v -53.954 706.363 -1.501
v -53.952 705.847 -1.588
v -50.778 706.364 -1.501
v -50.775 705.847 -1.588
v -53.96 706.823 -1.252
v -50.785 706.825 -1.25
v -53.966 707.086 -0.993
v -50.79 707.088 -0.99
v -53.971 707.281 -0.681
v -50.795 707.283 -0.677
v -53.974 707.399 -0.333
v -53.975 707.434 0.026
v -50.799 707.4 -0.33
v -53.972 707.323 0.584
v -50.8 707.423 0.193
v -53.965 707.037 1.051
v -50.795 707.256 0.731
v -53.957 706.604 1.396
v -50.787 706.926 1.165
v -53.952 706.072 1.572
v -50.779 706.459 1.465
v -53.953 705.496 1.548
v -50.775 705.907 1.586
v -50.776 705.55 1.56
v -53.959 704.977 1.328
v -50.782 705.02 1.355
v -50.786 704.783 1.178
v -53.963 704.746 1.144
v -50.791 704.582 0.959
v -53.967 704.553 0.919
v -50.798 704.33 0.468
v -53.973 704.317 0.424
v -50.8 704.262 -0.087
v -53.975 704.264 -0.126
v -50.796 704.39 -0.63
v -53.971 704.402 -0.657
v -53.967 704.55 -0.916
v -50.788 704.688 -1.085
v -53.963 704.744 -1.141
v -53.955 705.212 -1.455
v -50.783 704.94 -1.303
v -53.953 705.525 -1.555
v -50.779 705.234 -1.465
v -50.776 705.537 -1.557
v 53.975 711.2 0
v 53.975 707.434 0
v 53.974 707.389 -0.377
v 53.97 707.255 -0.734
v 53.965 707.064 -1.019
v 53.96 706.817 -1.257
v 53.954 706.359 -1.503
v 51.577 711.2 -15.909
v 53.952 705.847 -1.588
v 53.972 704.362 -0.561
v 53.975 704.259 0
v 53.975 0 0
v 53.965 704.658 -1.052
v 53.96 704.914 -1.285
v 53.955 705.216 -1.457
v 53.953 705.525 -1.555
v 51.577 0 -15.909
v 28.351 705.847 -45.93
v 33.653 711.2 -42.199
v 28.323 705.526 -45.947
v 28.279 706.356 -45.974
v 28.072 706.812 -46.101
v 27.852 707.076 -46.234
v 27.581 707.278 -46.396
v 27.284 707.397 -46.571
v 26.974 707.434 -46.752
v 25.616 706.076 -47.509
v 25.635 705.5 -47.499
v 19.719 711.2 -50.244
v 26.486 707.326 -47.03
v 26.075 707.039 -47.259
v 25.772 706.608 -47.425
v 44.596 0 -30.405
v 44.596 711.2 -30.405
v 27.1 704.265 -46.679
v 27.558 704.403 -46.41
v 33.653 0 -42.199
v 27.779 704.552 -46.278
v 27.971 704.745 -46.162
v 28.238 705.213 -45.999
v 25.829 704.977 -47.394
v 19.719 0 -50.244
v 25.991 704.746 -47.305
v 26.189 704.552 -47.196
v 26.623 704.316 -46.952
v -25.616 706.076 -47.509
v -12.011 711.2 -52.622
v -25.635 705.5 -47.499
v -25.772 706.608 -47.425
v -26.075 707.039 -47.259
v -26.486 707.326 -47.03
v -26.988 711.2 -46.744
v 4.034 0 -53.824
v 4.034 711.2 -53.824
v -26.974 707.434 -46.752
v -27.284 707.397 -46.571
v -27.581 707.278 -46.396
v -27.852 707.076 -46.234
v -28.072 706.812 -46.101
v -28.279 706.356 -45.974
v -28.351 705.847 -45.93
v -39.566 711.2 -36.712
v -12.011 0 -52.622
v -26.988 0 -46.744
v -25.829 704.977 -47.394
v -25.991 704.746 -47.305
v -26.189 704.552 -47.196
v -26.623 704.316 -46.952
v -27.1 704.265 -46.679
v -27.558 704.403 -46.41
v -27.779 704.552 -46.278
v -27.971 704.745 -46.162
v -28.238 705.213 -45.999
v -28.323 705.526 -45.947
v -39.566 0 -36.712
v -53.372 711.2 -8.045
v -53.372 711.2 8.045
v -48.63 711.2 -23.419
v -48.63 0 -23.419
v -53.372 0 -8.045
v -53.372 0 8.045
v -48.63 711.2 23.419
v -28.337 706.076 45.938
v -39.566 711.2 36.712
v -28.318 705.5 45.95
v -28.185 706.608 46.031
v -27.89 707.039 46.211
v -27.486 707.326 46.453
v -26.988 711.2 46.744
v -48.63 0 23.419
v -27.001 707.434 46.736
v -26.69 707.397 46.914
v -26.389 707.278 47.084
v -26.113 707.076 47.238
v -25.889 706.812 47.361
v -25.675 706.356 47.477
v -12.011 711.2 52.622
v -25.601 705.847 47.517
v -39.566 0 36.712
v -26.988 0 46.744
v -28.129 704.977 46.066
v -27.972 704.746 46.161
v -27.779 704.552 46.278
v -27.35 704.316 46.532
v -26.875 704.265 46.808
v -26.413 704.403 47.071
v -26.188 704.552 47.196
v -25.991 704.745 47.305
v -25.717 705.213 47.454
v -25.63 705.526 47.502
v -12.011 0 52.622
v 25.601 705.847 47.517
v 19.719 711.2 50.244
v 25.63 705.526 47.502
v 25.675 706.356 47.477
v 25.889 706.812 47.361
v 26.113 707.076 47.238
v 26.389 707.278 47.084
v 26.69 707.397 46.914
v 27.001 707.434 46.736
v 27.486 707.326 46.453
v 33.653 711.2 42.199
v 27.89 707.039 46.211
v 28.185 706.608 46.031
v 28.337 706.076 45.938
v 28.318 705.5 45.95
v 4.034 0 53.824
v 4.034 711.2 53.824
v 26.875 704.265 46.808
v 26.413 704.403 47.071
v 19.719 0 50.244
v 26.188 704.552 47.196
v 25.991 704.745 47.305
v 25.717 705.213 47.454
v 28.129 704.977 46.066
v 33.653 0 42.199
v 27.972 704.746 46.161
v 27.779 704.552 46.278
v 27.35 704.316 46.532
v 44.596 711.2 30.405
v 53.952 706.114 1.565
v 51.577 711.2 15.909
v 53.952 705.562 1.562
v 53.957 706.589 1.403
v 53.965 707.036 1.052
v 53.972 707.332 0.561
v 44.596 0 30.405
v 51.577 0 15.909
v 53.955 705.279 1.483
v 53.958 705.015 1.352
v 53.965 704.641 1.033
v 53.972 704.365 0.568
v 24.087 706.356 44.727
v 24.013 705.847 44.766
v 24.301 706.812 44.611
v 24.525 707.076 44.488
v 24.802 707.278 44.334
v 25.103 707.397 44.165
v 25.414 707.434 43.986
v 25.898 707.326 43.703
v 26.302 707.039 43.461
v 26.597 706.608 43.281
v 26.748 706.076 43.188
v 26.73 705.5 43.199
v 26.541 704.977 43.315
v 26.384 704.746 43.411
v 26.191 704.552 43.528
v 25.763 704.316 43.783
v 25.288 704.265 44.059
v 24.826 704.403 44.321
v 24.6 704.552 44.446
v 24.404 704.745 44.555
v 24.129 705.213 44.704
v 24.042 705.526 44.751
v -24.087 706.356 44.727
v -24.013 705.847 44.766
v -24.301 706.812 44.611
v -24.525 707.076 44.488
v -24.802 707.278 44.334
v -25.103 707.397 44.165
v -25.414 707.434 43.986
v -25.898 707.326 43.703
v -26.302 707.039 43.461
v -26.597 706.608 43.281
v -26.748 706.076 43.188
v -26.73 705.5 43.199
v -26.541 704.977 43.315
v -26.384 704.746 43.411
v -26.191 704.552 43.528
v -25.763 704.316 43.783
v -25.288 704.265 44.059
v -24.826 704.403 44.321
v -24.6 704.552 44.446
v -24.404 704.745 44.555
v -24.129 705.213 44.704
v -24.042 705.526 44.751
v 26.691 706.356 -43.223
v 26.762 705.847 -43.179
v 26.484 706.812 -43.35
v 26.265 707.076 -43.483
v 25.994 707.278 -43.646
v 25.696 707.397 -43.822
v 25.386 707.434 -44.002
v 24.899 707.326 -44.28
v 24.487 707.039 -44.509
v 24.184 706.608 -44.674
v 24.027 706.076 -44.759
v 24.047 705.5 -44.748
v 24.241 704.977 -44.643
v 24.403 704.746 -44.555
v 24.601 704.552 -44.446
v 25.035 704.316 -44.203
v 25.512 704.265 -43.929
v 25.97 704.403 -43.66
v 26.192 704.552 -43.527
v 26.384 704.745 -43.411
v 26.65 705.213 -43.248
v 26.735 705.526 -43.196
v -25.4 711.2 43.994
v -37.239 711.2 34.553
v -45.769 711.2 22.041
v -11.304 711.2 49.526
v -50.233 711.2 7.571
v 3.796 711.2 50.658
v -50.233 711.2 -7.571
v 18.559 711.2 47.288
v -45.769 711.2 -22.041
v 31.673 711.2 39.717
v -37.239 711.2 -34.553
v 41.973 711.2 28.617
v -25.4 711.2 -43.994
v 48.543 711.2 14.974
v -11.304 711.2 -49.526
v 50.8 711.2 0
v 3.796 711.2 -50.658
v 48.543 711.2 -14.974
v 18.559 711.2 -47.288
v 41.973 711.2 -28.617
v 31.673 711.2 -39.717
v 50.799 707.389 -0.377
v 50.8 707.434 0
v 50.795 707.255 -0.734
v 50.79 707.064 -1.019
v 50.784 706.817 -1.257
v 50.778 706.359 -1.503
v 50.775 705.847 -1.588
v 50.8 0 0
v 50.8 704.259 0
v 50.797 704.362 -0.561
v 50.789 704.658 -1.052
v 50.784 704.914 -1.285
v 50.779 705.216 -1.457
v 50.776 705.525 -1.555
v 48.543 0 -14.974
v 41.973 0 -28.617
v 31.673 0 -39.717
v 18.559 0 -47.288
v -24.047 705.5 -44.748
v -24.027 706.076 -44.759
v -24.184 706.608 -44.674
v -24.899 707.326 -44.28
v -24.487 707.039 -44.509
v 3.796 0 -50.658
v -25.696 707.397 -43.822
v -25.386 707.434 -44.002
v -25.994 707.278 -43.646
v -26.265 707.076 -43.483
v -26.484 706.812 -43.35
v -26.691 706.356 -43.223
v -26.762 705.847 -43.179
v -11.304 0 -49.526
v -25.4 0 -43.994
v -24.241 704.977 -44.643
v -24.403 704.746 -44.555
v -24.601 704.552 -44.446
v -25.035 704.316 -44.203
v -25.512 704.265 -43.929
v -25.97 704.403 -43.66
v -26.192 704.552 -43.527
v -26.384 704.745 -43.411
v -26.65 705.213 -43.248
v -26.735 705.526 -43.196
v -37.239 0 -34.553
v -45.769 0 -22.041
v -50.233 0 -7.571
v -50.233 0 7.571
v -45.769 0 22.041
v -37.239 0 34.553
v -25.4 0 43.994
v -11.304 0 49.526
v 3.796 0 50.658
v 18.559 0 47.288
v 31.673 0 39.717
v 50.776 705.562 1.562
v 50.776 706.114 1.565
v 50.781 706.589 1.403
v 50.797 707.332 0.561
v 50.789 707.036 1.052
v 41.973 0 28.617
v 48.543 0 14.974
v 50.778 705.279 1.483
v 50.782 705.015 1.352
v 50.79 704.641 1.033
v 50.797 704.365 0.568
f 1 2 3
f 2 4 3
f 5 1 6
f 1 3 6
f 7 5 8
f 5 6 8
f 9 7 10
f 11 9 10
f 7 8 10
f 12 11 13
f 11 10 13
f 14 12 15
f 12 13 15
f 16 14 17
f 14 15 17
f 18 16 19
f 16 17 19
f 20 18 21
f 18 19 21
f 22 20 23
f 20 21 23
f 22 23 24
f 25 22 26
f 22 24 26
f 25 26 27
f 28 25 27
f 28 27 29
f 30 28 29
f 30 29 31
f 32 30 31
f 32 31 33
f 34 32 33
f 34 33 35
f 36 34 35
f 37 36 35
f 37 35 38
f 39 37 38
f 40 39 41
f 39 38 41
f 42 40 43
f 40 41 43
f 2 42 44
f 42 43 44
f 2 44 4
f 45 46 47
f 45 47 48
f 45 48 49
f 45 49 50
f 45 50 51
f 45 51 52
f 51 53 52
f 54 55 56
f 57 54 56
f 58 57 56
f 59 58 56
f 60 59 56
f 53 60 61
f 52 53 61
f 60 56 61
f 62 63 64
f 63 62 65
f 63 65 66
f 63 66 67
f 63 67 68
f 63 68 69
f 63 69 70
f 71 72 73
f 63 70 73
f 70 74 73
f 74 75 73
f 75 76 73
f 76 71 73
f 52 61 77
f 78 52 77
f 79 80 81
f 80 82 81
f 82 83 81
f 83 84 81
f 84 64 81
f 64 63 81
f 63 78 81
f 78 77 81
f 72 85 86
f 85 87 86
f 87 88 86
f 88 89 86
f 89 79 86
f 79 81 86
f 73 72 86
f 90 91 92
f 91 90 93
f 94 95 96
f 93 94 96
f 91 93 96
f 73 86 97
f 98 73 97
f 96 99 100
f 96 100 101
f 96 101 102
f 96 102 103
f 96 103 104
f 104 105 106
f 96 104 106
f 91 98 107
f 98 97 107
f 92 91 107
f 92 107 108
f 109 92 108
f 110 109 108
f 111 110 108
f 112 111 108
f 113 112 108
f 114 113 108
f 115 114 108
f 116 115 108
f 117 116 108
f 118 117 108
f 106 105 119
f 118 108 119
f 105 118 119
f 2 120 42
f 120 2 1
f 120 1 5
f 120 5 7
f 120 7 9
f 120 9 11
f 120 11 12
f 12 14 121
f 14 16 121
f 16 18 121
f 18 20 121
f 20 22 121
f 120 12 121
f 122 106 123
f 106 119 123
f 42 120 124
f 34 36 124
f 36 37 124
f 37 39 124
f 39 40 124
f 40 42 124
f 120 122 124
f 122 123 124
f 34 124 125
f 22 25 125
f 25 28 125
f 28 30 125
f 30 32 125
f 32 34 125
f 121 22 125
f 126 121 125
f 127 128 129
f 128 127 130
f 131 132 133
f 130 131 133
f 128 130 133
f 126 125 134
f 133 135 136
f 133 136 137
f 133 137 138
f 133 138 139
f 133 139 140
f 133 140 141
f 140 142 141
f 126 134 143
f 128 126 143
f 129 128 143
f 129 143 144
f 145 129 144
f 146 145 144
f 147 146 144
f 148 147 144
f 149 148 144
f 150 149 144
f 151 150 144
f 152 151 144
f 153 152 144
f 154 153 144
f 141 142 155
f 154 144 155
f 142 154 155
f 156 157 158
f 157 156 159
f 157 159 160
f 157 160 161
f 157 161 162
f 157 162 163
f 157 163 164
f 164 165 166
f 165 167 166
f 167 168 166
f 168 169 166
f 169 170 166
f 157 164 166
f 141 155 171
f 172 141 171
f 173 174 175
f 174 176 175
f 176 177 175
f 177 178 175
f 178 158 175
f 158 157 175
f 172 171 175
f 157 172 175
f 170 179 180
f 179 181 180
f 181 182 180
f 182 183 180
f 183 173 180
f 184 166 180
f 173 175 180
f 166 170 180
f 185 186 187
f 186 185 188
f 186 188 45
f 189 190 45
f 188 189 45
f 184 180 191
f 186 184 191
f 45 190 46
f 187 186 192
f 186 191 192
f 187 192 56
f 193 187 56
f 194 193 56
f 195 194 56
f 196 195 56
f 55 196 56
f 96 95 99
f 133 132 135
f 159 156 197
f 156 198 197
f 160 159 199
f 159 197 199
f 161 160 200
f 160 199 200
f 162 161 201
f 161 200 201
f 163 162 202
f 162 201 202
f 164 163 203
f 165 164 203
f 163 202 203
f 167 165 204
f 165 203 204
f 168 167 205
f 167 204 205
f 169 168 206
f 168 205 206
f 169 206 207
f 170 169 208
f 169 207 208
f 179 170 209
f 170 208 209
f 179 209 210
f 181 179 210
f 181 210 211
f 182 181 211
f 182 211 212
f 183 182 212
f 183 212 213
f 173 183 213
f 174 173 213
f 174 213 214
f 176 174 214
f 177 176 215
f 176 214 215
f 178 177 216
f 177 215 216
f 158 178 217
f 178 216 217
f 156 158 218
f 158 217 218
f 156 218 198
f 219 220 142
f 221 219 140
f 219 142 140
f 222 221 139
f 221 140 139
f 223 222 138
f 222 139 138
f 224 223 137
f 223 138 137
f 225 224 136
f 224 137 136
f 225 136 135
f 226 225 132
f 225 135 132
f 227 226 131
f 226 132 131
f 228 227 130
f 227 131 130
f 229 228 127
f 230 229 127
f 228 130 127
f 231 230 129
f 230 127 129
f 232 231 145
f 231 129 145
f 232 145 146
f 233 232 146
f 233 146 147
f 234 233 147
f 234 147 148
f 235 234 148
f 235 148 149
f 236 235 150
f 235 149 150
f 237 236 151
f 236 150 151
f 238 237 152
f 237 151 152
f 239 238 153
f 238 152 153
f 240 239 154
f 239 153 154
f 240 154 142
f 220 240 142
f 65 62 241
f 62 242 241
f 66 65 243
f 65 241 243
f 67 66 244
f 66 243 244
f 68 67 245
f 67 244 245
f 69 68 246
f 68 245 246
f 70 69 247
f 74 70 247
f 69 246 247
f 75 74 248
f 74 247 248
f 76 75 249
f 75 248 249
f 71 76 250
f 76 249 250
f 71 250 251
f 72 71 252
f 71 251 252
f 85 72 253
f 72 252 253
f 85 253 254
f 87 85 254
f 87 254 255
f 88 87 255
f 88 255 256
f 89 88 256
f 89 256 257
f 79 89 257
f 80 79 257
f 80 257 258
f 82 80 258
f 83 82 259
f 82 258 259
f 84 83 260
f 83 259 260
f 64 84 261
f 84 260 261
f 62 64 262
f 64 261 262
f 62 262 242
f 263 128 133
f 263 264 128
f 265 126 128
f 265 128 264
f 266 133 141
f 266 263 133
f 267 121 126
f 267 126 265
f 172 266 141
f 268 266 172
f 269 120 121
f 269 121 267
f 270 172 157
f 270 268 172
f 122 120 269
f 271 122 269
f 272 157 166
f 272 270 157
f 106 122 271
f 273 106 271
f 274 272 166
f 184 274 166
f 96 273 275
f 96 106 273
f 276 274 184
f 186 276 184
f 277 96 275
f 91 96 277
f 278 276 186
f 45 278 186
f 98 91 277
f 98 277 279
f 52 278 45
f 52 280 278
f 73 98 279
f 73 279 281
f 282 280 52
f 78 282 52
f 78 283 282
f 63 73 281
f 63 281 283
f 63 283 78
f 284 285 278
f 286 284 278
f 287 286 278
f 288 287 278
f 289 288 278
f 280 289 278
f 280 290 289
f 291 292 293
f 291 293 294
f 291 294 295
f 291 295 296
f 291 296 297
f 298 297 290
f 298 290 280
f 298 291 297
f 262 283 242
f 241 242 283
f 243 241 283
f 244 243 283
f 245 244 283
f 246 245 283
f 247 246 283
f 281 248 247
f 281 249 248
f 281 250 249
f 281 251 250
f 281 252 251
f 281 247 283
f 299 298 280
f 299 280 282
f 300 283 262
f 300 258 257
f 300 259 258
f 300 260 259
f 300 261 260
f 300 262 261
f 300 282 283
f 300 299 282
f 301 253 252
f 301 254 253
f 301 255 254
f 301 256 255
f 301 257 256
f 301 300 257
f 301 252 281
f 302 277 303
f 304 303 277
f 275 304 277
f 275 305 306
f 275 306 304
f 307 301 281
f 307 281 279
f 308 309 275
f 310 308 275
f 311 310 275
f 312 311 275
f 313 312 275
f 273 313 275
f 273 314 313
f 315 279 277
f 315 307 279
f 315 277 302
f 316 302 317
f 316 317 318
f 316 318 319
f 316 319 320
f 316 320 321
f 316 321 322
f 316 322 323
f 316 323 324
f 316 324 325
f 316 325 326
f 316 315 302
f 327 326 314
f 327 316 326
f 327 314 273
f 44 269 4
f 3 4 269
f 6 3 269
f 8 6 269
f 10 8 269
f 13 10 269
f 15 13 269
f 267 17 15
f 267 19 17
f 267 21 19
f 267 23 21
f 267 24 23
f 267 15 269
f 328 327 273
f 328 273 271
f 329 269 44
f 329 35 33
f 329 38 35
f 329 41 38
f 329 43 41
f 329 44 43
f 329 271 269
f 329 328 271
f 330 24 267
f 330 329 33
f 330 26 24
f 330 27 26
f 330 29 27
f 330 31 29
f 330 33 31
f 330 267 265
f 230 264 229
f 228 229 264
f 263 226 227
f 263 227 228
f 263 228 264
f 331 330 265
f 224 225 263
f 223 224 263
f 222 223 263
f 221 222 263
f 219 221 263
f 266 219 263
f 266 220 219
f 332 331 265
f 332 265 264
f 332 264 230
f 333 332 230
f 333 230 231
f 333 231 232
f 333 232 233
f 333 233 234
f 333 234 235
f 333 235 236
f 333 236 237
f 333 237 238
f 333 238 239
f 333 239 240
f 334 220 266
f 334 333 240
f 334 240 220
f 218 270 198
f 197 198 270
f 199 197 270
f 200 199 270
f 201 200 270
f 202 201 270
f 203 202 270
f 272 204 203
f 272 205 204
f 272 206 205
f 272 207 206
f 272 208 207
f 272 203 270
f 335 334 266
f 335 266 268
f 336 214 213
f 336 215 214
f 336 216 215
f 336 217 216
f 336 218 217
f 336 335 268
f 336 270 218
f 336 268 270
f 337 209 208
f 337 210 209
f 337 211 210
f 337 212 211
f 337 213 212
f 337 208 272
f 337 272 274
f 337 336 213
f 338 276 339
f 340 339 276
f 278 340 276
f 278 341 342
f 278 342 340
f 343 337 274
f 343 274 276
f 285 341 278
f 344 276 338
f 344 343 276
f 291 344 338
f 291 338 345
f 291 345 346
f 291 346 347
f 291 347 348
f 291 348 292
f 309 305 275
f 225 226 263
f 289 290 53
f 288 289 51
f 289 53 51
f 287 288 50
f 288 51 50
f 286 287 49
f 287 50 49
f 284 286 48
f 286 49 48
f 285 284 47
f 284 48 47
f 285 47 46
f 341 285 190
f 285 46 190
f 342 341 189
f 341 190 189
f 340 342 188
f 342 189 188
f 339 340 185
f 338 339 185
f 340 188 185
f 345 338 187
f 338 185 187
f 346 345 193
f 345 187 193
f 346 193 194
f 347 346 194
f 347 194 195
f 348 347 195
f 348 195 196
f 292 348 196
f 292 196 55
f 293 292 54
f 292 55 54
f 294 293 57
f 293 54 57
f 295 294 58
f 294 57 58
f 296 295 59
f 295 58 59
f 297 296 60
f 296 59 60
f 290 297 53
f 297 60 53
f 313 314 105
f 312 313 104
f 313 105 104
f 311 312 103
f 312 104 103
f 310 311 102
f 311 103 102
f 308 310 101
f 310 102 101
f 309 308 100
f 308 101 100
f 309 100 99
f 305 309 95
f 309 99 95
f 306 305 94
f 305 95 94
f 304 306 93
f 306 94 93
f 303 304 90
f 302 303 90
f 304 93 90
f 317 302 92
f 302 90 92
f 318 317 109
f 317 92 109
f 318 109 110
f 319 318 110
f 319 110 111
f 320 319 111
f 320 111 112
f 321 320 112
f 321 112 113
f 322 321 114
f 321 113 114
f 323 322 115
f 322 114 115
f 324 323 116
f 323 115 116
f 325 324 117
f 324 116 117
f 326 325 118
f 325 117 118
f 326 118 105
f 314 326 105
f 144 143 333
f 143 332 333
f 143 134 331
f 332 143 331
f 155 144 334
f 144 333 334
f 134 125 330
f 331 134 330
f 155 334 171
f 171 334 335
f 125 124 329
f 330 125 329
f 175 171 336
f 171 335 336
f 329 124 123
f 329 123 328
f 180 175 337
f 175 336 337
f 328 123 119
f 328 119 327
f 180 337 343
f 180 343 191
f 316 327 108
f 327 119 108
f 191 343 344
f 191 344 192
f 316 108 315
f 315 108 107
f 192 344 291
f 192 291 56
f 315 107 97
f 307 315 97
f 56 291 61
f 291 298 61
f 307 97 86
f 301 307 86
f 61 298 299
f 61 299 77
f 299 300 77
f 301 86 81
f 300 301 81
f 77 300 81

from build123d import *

# Parameters (mm, degrees)
SKETCH1_R           = 53.975
SKETCH1_R_2         = 50.8
BOSS_EXTRUDE1_DEPTH = 711.2
SKETCH2_R           = 1.5875
CUT_EXTRUDE1_DEPTH  = 54.975
CIRPATTERN1_COUNT   = 3


with BuildPart() as part:
    # Sketch1 → Boss-Extrude1 (new body)
    with BuildSketch(Plane(origin=(0, 0, 0), x_dir=(1, 0, 0), z_dir=(0, 1, 0))):
        Circle(SKETCH1_R)
        Circle(SKETCH1_R_2, mode=Mode.SUBTRACT)
    extrude(amount=BOSS_EXTRUDE1_DEPTH)

    # Sketch2 → Cut-Extrude1 (cut, symmetric)
    with BuildSketch(Plane(origin=(0, 0, 0), x_dir=(0, 0, -1), z_dir=(1, 0, 0))):
        with Locations((0, 705.84695)):
            Circle(SKETCH2_R)
    cut_extrude1 = extrude(amount=CUT_EXTRUDE1_DEPTH, both=True, mode=Mode.SUBTRACT)

    # CirPattern1: Cut-Extrude1 ×3 about axis
    cirpattern1_axis = Axis((0, 711.2, 0), (0, 1, 0))
    for i in range(1, CIRPATTERN1_COUNT):
        add(cut_extrude1.rotate(cirpattern1_axis, i * 360 / CIRPATTERN1_COUNT), mode=Mode.SUBTRACT)


solid = part.part
